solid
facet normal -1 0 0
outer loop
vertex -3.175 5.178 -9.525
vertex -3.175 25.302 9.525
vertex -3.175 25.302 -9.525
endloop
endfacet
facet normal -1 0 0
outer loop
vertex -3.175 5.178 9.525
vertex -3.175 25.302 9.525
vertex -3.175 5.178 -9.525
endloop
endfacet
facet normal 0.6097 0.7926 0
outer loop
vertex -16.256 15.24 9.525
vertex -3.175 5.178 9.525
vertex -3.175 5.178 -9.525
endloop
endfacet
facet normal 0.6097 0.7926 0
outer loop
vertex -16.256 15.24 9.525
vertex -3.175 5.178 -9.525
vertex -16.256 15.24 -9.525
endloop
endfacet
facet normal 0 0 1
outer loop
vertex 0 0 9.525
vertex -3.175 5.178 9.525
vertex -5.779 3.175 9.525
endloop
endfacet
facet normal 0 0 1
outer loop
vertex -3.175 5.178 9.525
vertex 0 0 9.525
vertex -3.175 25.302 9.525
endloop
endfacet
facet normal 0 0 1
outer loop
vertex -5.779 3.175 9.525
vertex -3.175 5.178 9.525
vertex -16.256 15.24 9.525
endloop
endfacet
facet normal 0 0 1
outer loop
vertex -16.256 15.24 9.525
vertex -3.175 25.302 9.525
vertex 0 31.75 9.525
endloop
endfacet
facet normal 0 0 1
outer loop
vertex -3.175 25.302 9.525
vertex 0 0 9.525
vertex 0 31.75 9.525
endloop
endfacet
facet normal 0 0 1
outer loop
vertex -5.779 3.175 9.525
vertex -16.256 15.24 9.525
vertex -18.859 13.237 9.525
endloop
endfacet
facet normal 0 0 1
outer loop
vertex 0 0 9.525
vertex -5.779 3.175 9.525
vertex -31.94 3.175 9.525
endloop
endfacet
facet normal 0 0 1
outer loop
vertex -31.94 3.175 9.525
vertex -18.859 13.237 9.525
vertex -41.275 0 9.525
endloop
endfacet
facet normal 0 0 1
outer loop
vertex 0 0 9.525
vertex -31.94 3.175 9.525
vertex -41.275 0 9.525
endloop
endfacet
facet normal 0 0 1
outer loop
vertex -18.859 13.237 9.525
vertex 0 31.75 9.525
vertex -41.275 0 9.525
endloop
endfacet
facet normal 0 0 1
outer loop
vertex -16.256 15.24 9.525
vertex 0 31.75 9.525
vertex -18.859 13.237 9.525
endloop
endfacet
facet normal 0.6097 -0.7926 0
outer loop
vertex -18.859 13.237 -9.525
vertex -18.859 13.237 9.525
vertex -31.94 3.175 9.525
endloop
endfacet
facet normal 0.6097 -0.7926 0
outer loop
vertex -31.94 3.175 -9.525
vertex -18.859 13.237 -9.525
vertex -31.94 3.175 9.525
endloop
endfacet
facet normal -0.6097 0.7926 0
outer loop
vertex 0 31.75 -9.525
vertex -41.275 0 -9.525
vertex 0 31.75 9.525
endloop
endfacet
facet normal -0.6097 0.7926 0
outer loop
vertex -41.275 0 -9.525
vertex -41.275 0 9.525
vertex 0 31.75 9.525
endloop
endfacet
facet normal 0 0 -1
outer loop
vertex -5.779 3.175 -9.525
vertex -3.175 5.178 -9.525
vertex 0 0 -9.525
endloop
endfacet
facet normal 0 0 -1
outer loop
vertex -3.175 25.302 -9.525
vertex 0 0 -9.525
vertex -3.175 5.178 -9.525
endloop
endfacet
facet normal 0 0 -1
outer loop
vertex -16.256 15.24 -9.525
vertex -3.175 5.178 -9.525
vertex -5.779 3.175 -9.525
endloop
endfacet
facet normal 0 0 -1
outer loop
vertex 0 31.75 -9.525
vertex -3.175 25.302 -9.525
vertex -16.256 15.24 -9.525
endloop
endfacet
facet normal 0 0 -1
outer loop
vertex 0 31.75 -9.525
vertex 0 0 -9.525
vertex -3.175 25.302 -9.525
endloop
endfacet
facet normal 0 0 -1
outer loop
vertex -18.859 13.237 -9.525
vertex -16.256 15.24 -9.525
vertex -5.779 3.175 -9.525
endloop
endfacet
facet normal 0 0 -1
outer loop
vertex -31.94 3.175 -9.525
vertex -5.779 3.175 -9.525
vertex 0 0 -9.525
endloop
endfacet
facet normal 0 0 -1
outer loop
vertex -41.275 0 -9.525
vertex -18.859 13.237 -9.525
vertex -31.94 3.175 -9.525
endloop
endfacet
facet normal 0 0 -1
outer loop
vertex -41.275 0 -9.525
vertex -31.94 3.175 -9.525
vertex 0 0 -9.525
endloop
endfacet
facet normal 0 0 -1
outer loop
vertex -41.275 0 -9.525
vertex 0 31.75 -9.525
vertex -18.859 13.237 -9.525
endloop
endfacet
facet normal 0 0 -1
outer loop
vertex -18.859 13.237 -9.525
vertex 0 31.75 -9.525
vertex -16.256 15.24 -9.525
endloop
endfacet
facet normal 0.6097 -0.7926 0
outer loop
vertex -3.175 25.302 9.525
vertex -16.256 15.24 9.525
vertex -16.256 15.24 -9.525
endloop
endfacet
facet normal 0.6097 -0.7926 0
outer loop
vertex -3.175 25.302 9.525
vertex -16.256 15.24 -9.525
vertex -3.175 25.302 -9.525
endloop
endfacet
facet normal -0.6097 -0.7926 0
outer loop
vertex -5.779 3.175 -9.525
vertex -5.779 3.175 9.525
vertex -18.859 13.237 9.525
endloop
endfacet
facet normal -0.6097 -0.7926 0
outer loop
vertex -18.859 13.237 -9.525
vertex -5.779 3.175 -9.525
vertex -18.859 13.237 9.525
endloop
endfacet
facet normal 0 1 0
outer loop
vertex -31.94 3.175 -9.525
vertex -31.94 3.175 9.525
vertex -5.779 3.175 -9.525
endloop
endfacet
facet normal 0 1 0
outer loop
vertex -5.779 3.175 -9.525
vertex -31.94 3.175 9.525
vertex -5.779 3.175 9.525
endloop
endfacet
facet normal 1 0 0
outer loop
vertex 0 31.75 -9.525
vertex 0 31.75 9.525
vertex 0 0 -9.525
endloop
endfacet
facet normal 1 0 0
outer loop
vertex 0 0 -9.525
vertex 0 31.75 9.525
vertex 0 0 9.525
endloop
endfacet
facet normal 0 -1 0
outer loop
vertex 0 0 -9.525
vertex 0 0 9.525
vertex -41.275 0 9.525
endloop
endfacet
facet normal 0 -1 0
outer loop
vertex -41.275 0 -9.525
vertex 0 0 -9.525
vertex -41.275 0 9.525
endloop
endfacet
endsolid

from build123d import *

# Parameters (mm, degrees)
BOSS_EXTRUDE1_DEPTH     = 9.525
CUT_EXTRUDE1_DEPTH      = 10.525
CUT_EXTRUDE1_DEPTH_BACK = 10.525


with BuildPart() as part:
    # Sketch1 → Boss-Extrude1 (new body, symmetric)
    with BuildSketch(Plane.XY):
        Polygon((0, 0), (-41.275, 0), (0, 31.75), align=None)
    extrude(amount=BOSS_EXTRUDE1_DEPTH, both=True)

    # Sketch2 → Cut-Extrude1 (cut, two sides)
    with BuildSketch(Plane.XY) as cut_extrude1_sk:
        Polygon((-3.175, 5.177841223), (-16.255709614, 15.239925542), (-3.175, 25.302009861), align=None)
        Polygon((-5.77869359, 3.175), (-18.859403205, 13.237084319), (-31.940112819, 3.175), align=None)
    extrude(amount=CUT_EXTRUDE1_DEPTH, mode=Mode.SUBTRACT)
    extrude(cut_extrude1_sk.sketch, amount=-CUT_EXTRUDE1_DEPTH_BACK, mode=Mode.SUBTRACT)


solid = part.part
